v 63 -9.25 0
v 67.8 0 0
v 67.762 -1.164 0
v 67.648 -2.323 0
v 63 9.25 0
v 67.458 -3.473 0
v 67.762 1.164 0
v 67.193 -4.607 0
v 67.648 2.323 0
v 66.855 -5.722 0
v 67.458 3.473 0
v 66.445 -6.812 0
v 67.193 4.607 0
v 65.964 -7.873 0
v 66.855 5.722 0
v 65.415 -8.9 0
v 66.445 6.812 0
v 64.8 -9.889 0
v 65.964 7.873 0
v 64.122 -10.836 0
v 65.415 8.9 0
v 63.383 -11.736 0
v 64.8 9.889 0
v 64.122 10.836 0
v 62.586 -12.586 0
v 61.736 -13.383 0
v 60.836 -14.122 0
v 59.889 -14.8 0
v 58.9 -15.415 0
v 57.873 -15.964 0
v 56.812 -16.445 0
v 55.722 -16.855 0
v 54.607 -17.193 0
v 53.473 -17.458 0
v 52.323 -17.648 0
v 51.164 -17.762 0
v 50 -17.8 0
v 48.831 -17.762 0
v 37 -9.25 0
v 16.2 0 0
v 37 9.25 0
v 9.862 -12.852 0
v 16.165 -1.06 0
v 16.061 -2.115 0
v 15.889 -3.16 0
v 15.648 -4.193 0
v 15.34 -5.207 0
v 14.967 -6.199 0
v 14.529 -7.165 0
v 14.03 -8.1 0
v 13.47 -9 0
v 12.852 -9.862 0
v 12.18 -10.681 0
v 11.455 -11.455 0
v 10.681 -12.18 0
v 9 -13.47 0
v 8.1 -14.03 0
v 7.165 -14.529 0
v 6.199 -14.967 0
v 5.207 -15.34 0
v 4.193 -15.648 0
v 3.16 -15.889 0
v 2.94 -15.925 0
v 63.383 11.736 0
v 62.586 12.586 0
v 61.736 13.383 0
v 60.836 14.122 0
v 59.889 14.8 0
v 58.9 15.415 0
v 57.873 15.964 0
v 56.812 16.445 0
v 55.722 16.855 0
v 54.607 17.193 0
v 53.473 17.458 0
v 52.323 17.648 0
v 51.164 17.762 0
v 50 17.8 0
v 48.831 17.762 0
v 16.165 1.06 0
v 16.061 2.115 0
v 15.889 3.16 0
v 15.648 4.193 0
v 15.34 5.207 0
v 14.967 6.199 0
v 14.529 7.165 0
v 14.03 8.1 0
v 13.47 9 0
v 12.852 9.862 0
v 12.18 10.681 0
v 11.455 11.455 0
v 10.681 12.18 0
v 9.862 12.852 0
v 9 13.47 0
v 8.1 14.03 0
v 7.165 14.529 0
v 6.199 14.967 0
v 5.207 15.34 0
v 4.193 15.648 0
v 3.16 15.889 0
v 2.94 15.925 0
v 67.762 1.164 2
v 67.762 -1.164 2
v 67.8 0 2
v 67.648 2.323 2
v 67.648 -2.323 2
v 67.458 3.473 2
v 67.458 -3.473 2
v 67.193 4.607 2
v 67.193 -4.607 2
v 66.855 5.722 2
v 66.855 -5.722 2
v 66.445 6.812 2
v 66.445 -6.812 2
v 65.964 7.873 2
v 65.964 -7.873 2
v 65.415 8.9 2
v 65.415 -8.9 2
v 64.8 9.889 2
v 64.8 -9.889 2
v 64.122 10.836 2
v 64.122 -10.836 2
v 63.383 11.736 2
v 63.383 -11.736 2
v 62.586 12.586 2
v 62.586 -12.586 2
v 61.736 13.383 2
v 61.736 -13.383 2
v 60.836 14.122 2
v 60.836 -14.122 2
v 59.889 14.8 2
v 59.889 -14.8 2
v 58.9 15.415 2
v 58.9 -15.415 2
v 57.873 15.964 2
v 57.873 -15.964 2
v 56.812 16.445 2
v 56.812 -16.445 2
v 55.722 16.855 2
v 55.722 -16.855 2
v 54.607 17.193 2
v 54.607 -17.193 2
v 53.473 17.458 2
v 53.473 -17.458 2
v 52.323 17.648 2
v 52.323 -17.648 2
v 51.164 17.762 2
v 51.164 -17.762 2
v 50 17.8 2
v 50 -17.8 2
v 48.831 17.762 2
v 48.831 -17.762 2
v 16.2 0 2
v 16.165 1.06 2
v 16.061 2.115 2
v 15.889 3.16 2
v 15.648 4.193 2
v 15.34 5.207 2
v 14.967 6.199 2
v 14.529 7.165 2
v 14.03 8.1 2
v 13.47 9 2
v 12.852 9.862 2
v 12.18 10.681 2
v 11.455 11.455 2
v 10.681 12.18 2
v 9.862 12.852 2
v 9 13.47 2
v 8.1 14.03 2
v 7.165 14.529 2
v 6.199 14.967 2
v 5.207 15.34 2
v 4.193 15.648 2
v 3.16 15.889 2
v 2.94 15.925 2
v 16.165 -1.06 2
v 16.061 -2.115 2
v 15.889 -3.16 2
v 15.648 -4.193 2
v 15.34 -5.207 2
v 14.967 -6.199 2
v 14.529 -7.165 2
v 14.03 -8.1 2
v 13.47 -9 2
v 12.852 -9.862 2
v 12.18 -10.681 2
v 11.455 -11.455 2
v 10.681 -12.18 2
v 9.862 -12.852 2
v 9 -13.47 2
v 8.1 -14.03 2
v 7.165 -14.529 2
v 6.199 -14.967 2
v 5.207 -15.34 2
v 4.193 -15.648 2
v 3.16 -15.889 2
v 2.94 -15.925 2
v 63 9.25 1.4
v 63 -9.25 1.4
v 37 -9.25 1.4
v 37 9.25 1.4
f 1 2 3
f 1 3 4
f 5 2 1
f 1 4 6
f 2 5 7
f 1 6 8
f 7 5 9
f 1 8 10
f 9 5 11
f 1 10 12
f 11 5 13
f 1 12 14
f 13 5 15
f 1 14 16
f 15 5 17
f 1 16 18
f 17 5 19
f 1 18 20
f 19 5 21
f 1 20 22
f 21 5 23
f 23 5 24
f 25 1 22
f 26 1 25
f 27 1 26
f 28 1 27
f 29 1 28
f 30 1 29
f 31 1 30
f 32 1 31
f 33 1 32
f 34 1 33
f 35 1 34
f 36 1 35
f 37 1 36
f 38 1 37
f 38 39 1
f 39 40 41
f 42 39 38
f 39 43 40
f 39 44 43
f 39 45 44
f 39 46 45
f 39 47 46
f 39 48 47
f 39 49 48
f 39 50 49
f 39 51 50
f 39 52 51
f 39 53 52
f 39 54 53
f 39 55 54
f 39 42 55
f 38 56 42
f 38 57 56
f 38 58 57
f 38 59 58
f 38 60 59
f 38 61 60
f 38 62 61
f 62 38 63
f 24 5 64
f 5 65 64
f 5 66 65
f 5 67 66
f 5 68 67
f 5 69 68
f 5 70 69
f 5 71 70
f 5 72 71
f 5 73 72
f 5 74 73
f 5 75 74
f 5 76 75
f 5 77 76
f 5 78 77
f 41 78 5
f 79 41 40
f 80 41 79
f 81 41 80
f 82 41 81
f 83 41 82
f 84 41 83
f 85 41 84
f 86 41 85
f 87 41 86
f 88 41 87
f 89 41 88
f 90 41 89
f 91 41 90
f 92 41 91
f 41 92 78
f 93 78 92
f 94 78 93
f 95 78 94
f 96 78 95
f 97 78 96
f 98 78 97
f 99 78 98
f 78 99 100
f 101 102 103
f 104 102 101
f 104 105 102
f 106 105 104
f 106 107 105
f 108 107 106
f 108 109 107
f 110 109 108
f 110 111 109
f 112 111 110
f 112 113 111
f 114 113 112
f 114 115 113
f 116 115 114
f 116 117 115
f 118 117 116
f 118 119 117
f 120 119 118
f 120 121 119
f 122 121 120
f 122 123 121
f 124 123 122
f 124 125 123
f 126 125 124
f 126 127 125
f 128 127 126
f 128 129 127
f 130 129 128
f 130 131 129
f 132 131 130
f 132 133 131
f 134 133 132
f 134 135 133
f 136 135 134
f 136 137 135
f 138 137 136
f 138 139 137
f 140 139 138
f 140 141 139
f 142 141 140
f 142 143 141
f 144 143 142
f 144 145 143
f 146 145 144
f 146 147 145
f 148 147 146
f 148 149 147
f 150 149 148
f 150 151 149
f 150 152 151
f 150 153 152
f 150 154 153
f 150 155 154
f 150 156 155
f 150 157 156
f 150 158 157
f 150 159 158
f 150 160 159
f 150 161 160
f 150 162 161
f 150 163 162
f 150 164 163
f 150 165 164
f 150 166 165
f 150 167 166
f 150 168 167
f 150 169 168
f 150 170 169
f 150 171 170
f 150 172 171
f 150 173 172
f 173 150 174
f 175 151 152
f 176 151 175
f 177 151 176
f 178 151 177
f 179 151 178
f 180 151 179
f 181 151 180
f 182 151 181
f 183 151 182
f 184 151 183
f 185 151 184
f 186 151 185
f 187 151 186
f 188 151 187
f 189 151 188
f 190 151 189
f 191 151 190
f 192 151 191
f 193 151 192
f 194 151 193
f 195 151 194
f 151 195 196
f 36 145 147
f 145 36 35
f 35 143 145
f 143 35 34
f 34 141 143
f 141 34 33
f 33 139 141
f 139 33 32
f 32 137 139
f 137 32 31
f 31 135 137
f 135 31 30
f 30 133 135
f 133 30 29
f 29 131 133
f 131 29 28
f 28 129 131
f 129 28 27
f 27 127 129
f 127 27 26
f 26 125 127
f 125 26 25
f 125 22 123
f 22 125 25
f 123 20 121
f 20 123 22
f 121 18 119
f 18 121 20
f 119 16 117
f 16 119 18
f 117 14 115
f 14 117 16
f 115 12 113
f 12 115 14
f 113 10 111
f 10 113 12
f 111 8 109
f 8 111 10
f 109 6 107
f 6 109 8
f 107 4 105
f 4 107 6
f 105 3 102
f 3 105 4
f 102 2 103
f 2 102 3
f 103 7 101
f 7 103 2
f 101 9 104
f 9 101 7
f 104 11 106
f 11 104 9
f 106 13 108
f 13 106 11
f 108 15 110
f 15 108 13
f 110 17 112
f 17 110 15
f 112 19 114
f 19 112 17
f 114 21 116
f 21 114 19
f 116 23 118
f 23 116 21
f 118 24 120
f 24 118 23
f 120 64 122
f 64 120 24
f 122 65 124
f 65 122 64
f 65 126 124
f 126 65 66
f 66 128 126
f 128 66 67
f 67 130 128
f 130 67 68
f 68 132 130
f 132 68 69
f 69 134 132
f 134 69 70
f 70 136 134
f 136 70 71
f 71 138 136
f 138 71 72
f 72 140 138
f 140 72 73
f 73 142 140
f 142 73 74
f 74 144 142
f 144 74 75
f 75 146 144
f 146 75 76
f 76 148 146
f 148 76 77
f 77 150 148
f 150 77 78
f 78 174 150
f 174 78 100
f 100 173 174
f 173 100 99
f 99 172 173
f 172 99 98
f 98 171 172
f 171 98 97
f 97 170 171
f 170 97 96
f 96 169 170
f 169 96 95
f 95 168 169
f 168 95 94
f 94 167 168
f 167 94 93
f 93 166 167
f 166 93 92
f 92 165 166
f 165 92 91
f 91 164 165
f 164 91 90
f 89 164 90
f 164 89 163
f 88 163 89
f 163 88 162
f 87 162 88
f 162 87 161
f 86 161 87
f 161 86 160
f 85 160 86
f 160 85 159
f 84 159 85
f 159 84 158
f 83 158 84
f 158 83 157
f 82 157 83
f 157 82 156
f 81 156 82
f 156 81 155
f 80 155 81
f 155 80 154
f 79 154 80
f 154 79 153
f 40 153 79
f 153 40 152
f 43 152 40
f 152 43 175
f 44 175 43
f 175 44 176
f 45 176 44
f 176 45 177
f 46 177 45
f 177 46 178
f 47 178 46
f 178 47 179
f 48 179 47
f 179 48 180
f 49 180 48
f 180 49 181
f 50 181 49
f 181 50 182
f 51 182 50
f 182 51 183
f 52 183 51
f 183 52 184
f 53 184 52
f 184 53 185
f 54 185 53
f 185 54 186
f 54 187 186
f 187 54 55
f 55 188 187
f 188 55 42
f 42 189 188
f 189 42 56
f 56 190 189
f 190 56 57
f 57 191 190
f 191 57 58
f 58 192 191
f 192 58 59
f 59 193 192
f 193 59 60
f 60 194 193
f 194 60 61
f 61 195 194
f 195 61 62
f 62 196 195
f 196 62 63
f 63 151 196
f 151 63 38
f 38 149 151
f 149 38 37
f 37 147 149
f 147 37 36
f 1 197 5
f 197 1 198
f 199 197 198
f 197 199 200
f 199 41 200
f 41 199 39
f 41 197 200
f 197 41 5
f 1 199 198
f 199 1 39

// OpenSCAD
// file: model.scad
// GV30 lux add-on: a split ring between the clamp's stub shoulder and the GV30, with an arm carrying a
// lux sensor. The split runs down the arm's middle, so it opens around the coax and the cord can lie in it.
// A cover drops into a recess over the arm, flush with the ring's top, and is thinned to a skin over the
// sensor: the diffuser.
// Origin: antenna axis on Z, z = 0 on the stub's shoulder.
// Print: body as shown; cover upside down (skin on the bed).

part = "assembly";   // [body, cover, assembly]

/* [Ring] */
od = 32;            // the shoulder it sits on, off ref/clamp-upper.stl
id = 26;            // over the 1"-14 stub (OD 25.2)
h = 8;              // costs this much thread engagement (GV30 thread depth not measured)
split = 1.5;        // gap

/* [Arm and head] */
reach = 50;         // antenna axis to sensor centre
head_d = 36;

/* [Sensor: VEML7700, Adafruit 4162, 25.4 x 17.8 (vendor; not measured)] */
board_l = 26;
board_w = 18.5;
pocket = 3;         // below the cover: board 1.6 and its parts

/* [Cover] */
cover_t = 2;
skin = 0.6;         // white ASA over the sensor, 3 layers at 0.2
fit = 0.2;          // cover to recess, each side

$fn = 96;
e = 0.01;

module outline() hull() { circle(d = od); translate([reach, 0]) circle(d = head_d); }

// the arm's part of the outline: everything outside the ring
module arm_outline(grow = 0, spill = 0) intersection() {
  difference() { offset(delta = grow + spill) outline(); circle(d = od - 2 * grow); }
  translate([1, -head_d]) square([reach + head_d, 2 * head_d]);   // keeps off the ring's tangent points
}

module body() {
  difference() {
    linear_extrude(h) outline();
    translate([0, 0, -e]) cylinder(d = id, h = h + 2 * e);
    translate([0, -split / 2, -e]) cube([reach + head_d, split, h + 2 * e]);
    translate([0, 0, h - cover_t]) linear_extrude(cover_t + e) arm_outline(spill = 1);
    translate([reach - board_l / 2, -board_w / 2, h - cover_t - pocket]) cube([board_l, board_w, pocket + e]);
  }
}

module cover() {
  // z = 0 is the underside
  difference() {
    linear_extrude(cover_t) arm_outline(-fit);
    translate([reach - board_l / 2, -board_w / 2, -e]) cube([board_l, board_w, cover_t - skin + e]);
  }
}

module assembly() {
  color("lightgrey") body();
  color("white") translate([0, 0, h - cover_t]) cover();
}

if (part == "body") body();
else if (part == "cover") cover();
else assembly();
// main file
// The cover. Prints upside down: the skin on the bed.
include <model.scad>
part = "cover";
